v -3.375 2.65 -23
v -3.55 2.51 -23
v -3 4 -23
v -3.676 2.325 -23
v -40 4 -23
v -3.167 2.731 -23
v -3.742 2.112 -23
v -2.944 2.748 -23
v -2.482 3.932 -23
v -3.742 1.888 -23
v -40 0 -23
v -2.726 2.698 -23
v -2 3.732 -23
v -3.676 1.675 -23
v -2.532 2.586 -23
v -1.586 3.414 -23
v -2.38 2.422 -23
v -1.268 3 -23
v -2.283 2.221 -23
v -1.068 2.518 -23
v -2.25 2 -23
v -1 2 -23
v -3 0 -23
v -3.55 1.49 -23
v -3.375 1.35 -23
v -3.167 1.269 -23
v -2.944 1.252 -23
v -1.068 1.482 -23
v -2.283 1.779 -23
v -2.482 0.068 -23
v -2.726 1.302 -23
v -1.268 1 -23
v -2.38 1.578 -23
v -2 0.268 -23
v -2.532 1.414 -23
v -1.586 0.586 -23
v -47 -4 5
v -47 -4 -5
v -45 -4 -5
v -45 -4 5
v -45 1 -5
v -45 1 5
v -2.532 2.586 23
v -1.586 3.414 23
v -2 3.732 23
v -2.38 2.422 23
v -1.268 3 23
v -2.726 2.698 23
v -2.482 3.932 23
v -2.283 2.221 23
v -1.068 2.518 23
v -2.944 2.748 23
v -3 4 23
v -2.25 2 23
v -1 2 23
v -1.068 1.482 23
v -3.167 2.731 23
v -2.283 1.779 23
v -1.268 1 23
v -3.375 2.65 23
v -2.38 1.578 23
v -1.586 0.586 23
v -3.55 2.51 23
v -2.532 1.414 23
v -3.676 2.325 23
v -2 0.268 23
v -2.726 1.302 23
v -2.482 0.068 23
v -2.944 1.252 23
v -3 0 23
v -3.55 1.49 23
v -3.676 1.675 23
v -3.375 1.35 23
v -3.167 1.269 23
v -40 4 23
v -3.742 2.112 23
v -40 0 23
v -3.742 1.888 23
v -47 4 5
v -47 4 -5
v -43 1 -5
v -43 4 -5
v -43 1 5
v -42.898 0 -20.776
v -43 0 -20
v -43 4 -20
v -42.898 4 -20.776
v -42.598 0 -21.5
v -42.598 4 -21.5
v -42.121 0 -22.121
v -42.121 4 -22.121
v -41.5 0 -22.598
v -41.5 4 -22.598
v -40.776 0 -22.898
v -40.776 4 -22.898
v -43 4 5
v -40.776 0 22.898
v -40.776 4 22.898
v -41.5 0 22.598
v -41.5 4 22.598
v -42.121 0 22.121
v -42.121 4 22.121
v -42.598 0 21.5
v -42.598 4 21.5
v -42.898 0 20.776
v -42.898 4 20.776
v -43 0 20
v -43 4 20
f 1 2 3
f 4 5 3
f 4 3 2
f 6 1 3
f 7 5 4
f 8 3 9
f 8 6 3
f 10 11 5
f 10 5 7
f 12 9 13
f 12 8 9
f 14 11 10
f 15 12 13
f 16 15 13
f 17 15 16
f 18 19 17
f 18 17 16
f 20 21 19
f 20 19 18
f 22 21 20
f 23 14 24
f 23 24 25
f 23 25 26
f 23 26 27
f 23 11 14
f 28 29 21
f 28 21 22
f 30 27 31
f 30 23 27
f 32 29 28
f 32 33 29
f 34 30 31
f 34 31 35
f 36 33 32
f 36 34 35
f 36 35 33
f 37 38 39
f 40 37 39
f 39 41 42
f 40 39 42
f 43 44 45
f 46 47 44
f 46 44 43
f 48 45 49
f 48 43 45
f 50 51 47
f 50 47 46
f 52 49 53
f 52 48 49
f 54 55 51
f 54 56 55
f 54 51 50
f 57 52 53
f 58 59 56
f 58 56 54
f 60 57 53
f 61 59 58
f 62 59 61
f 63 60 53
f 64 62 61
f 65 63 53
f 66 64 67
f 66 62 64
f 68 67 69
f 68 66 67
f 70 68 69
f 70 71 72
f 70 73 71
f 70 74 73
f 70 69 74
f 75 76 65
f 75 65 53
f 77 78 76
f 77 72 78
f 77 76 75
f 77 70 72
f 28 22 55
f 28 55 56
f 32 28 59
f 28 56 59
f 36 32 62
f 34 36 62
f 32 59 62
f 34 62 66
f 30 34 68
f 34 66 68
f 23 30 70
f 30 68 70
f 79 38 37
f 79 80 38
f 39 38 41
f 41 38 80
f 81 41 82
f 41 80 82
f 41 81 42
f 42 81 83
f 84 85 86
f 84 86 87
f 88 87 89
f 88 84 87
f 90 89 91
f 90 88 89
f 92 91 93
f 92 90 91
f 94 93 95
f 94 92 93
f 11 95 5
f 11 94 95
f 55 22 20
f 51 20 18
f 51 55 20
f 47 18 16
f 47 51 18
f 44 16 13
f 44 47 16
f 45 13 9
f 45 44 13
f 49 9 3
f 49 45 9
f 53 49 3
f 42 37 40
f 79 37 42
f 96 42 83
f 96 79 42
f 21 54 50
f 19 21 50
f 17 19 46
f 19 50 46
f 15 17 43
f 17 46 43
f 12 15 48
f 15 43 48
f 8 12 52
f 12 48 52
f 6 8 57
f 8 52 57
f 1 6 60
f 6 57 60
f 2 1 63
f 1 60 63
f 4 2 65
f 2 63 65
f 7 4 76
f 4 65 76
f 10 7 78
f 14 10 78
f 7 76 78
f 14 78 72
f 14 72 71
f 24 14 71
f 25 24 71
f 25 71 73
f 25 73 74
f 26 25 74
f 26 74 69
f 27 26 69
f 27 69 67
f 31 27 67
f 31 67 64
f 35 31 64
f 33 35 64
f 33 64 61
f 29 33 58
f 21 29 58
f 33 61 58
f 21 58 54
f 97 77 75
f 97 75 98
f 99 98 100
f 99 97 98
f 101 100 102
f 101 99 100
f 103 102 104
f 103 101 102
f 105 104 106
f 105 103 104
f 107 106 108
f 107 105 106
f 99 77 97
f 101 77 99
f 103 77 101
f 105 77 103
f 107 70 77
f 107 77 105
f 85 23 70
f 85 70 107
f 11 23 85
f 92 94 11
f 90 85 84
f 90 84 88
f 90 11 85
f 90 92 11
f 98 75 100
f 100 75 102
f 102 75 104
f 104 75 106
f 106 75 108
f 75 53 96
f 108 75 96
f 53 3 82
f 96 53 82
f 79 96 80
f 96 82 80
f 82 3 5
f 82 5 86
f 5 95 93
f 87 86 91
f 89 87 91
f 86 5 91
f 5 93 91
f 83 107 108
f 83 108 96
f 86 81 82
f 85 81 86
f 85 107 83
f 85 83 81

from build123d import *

# Parameters (mm, degrees)
BOSS_EXTRUDE1_DEPTH = 4
FILLET1_R           = 2
SKETCH2_R           = 0.75
CUT_EXTRUDE1_DEPTH  = 46
SKETCH4_W           = 10
SKETCH4_H           = 3
BOSS_EXTRUDE2_DEPTH = 4
SKETCH6_W           = 2
SKETCH6_H           = 10
BOSS_EXTRUDE3_DEPTH = 5


with BuildPart() as part:
    # Sketch1 → Boss-Extrude1 (new body)
    with BuildSketch(Plane(origin=(0, 0, 0), x_dir=(1, 0, 0), z_dir=(0, 1, 0))):
        with BuildLine():
            Line((-1, 23), (-1, -23))
            Line((-1, -23), (-40, -23))
            ThreePointArc((-40, -23), (-42.121320344, -22.121320344), (-43, -20))
            Line((-43, -20), (-43, 20))
            ThreePointArc((-43, 20), (-42.121320344, 22.121320344), (-40, 23))
            Line((-40, 23), (-1, 23))
        make_face()
    extrude(amount=BOSS_EXTRUDE1_DEPTH)

    # Fillet1
    fillet1_edges = [part.edges().sort_by_distance(p)[0] for p in [
        (-1, 0, 0),
        (-1, 4, 0),
    ]]
    fillet(fillet1_edges, radius=FILLET1_R - 0.0001)  # a hair under: the kernel refuses the full size

    # Sketch2 → Cut-Extrude1 (cut)
    with BuildSketch(Plane.XY.offset(23)):
        with Locations((-3, 2)):
            Circle(SKETCH2_R)
    extrude(amount=-CUT_EXTRUDE1_DEPTH, mode=Mode.SUBTRACT)

    # Sketch4 → Boss-Extrude2 (add)
    with BuildSketch(Plane.ZY.offset(43)):
        with Locations((0, 2.5)):
            Rectangle(SKETCH4_W, SKETCH4_H)
    extrude(amount=BOSS_EXTRUDE2_DEPTH)

    # Sketch6 → Boss-Extrude3 (add)
    with BuildSketch(Plane.XZ.offset(-1)):
        with Locations((-46, 0)):
            Rectangle(SKETCH6_W, SKETCH6_H)
    extrude(amount=BOSS_EXTRUDE3_DEPTH)


solid = part.part
